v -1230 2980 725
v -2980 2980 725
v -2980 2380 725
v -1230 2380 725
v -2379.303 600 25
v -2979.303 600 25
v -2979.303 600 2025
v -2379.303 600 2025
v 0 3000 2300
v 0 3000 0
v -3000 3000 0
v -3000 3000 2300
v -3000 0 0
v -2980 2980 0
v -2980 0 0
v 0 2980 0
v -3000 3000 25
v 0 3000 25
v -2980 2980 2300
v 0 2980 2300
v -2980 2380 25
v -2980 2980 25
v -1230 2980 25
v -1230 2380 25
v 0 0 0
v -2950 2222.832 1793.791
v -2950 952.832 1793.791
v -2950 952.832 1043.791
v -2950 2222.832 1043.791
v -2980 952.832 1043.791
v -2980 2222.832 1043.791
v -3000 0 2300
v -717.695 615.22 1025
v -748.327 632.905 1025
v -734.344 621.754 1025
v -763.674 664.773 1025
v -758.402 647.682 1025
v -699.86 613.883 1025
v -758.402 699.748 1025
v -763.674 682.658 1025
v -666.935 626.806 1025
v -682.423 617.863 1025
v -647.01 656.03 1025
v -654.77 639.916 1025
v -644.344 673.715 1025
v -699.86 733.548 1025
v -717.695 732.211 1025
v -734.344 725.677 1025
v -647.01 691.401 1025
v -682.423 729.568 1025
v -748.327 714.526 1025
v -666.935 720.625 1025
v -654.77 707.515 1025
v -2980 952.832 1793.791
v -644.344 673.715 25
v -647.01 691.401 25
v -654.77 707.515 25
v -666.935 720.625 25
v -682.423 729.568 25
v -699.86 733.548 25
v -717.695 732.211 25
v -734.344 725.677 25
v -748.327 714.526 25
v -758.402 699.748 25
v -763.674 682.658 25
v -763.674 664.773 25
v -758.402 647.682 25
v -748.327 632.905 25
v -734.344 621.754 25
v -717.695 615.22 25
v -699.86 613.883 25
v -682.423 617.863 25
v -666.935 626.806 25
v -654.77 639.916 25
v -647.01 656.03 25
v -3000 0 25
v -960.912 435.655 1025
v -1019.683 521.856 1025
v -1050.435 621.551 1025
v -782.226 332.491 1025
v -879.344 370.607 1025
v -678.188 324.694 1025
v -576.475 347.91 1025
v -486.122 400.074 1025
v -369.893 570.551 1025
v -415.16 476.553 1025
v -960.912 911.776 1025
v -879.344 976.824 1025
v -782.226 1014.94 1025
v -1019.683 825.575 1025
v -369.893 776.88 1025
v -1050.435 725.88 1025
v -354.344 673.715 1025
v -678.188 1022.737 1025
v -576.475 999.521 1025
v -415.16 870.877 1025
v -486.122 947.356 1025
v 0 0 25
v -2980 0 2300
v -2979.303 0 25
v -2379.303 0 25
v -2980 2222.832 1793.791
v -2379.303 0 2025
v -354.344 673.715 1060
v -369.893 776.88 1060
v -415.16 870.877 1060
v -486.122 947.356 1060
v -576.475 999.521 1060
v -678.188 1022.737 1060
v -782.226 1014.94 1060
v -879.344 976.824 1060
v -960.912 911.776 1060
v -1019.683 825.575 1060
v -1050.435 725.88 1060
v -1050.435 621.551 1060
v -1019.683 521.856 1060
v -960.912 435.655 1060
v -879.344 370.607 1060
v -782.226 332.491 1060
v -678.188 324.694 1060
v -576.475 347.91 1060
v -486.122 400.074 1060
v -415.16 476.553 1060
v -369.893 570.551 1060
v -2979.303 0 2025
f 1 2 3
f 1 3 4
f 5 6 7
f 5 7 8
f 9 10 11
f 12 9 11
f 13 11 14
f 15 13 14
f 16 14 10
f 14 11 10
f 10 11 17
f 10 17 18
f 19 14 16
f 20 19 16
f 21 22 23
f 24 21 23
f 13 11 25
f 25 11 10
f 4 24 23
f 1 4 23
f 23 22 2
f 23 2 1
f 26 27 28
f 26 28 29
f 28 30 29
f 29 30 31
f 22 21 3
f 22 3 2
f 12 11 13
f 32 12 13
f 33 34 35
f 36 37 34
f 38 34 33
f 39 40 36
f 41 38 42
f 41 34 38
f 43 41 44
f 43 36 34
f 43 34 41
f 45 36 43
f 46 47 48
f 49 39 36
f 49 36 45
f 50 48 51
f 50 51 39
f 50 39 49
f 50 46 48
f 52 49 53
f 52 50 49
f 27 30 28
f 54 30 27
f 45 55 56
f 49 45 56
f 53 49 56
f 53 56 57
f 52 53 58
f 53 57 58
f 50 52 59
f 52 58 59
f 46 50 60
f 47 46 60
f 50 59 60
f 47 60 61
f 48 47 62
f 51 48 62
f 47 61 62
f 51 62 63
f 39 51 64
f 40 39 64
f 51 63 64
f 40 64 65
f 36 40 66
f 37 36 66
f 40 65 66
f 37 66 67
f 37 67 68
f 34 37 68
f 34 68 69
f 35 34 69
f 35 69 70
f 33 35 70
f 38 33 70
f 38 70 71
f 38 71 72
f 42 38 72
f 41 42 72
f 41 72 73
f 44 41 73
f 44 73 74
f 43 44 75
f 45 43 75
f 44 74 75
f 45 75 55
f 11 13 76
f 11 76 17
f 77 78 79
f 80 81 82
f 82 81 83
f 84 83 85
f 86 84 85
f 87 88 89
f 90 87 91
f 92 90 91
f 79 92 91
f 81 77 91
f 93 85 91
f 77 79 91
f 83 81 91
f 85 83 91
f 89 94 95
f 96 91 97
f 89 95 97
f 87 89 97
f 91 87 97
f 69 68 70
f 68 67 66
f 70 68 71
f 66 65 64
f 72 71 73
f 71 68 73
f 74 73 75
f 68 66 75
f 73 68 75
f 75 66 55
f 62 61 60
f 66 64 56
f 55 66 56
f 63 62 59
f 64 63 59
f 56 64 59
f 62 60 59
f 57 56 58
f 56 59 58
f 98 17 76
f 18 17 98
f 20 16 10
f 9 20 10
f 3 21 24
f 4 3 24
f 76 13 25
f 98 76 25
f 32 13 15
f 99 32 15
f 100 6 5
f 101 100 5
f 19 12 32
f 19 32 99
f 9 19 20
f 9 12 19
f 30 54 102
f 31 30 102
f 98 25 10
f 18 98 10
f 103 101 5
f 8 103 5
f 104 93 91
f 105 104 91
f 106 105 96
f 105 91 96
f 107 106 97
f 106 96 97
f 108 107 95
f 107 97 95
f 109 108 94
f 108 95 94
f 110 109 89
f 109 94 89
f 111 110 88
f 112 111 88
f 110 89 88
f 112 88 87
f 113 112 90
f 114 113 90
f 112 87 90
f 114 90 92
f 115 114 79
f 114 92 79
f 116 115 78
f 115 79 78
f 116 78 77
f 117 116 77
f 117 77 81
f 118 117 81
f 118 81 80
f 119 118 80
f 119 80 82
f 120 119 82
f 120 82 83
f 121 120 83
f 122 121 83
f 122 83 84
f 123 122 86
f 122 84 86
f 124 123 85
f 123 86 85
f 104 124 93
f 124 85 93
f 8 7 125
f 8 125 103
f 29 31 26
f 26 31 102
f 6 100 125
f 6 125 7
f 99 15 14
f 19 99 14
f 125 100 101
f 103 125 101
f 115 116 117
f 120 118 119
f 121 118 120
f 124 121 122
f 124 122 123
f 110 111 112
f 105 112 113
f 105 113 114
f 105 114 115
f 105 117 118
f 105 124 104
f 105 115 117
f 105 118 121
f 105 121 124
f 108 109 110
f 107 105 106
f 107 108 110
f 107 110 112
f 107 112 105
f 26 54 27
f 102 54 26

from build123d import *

# Parameters (mm, degrees)
F0_W      = 3000
F0_H      = 3000
F2_DEPTH  = 25
F3_DEPTH  = 2300
F4_W      = 1750
F4_H      = 600
F5_DEPTH  = 700
F6_W      = 600
F6_H      = 600
F7_DEPTH  = 2000
F9_R      = 60
F10_DEPTH = 1000
F11_R     = 350
F12_DEPTH = 35
F13_W     = 1270
F13_H     = 750
F14_DEPTH = 30


with BuildPart() as f2:
    # F0 (on Top) → F2 (new body)
    with BuildSketch(Plane.XY):
        with Locations((-1500, 1500)):
            Rectangle(F0_W, F0_H)
    extrude(amount=F2_DEPTH)


with BuildPart() as f3:
    # F1 (on Top) → F3 (new body)
    with BuildSketch(Plane.XY):
        Polygon((0, 2980), (0, 3000), (-3000, 3000), (-3000, 0), (-2980, 0), (-2980, 2980), align=None)
    extrude(amount=F3_DEPTH)


with BuildPart() as f5:
    # F4 (on face) → F5 (new body)
    with BuildSketch(Plane.XY.offset(25)):
        with Locations((-2105, 2680)):
            Rectangle(F4_W, F4_H)
    extrude(amount=F5_DEPTH)


with BuildPart() as f7:
    # F6 (on face) → F7 (new body)
    with BuildSketch(Plane.XY.offset(25)):
        with Locations((-2679.3028831482, 300)):
            Rectangle(F6_W, F6_H)
    extrude(amount=F7_DEPTH)


with BuildPart() as f10:
    # F9 (on face) → F10 (new body)
    with BuildSketch(Plane.XY.offset(25)):
        with Locations((-704.3439149857, 673.7154126167)):
            Circle(F9_R)
    extrude(amount=F10_DEPTH)


with BuildPart() as f12:
    # F11 (on face) → F12 (new body)
    with BuildSketch(Plane.XY.offset(1025)):
        with Locations((-704.3439149857, 673.7154126167)):
            Circle(F11_R)
    extrude(amount=F12_DEPTH)


with BuildPart() as f14:
    # F13 (on face) → F14 (new body)
    with BuildSketch(Plane.YZ.offset(-2980)):
        with Locations((1587.831735611, 1418.7914731905)):
            Rectangle(F13_W, F13_H)
    extrude(amount=F14_DEPTH)


solid = Compound([f2.part, f3.part, f5.part, f7.part, f10.part, f12.part, f14.part])
